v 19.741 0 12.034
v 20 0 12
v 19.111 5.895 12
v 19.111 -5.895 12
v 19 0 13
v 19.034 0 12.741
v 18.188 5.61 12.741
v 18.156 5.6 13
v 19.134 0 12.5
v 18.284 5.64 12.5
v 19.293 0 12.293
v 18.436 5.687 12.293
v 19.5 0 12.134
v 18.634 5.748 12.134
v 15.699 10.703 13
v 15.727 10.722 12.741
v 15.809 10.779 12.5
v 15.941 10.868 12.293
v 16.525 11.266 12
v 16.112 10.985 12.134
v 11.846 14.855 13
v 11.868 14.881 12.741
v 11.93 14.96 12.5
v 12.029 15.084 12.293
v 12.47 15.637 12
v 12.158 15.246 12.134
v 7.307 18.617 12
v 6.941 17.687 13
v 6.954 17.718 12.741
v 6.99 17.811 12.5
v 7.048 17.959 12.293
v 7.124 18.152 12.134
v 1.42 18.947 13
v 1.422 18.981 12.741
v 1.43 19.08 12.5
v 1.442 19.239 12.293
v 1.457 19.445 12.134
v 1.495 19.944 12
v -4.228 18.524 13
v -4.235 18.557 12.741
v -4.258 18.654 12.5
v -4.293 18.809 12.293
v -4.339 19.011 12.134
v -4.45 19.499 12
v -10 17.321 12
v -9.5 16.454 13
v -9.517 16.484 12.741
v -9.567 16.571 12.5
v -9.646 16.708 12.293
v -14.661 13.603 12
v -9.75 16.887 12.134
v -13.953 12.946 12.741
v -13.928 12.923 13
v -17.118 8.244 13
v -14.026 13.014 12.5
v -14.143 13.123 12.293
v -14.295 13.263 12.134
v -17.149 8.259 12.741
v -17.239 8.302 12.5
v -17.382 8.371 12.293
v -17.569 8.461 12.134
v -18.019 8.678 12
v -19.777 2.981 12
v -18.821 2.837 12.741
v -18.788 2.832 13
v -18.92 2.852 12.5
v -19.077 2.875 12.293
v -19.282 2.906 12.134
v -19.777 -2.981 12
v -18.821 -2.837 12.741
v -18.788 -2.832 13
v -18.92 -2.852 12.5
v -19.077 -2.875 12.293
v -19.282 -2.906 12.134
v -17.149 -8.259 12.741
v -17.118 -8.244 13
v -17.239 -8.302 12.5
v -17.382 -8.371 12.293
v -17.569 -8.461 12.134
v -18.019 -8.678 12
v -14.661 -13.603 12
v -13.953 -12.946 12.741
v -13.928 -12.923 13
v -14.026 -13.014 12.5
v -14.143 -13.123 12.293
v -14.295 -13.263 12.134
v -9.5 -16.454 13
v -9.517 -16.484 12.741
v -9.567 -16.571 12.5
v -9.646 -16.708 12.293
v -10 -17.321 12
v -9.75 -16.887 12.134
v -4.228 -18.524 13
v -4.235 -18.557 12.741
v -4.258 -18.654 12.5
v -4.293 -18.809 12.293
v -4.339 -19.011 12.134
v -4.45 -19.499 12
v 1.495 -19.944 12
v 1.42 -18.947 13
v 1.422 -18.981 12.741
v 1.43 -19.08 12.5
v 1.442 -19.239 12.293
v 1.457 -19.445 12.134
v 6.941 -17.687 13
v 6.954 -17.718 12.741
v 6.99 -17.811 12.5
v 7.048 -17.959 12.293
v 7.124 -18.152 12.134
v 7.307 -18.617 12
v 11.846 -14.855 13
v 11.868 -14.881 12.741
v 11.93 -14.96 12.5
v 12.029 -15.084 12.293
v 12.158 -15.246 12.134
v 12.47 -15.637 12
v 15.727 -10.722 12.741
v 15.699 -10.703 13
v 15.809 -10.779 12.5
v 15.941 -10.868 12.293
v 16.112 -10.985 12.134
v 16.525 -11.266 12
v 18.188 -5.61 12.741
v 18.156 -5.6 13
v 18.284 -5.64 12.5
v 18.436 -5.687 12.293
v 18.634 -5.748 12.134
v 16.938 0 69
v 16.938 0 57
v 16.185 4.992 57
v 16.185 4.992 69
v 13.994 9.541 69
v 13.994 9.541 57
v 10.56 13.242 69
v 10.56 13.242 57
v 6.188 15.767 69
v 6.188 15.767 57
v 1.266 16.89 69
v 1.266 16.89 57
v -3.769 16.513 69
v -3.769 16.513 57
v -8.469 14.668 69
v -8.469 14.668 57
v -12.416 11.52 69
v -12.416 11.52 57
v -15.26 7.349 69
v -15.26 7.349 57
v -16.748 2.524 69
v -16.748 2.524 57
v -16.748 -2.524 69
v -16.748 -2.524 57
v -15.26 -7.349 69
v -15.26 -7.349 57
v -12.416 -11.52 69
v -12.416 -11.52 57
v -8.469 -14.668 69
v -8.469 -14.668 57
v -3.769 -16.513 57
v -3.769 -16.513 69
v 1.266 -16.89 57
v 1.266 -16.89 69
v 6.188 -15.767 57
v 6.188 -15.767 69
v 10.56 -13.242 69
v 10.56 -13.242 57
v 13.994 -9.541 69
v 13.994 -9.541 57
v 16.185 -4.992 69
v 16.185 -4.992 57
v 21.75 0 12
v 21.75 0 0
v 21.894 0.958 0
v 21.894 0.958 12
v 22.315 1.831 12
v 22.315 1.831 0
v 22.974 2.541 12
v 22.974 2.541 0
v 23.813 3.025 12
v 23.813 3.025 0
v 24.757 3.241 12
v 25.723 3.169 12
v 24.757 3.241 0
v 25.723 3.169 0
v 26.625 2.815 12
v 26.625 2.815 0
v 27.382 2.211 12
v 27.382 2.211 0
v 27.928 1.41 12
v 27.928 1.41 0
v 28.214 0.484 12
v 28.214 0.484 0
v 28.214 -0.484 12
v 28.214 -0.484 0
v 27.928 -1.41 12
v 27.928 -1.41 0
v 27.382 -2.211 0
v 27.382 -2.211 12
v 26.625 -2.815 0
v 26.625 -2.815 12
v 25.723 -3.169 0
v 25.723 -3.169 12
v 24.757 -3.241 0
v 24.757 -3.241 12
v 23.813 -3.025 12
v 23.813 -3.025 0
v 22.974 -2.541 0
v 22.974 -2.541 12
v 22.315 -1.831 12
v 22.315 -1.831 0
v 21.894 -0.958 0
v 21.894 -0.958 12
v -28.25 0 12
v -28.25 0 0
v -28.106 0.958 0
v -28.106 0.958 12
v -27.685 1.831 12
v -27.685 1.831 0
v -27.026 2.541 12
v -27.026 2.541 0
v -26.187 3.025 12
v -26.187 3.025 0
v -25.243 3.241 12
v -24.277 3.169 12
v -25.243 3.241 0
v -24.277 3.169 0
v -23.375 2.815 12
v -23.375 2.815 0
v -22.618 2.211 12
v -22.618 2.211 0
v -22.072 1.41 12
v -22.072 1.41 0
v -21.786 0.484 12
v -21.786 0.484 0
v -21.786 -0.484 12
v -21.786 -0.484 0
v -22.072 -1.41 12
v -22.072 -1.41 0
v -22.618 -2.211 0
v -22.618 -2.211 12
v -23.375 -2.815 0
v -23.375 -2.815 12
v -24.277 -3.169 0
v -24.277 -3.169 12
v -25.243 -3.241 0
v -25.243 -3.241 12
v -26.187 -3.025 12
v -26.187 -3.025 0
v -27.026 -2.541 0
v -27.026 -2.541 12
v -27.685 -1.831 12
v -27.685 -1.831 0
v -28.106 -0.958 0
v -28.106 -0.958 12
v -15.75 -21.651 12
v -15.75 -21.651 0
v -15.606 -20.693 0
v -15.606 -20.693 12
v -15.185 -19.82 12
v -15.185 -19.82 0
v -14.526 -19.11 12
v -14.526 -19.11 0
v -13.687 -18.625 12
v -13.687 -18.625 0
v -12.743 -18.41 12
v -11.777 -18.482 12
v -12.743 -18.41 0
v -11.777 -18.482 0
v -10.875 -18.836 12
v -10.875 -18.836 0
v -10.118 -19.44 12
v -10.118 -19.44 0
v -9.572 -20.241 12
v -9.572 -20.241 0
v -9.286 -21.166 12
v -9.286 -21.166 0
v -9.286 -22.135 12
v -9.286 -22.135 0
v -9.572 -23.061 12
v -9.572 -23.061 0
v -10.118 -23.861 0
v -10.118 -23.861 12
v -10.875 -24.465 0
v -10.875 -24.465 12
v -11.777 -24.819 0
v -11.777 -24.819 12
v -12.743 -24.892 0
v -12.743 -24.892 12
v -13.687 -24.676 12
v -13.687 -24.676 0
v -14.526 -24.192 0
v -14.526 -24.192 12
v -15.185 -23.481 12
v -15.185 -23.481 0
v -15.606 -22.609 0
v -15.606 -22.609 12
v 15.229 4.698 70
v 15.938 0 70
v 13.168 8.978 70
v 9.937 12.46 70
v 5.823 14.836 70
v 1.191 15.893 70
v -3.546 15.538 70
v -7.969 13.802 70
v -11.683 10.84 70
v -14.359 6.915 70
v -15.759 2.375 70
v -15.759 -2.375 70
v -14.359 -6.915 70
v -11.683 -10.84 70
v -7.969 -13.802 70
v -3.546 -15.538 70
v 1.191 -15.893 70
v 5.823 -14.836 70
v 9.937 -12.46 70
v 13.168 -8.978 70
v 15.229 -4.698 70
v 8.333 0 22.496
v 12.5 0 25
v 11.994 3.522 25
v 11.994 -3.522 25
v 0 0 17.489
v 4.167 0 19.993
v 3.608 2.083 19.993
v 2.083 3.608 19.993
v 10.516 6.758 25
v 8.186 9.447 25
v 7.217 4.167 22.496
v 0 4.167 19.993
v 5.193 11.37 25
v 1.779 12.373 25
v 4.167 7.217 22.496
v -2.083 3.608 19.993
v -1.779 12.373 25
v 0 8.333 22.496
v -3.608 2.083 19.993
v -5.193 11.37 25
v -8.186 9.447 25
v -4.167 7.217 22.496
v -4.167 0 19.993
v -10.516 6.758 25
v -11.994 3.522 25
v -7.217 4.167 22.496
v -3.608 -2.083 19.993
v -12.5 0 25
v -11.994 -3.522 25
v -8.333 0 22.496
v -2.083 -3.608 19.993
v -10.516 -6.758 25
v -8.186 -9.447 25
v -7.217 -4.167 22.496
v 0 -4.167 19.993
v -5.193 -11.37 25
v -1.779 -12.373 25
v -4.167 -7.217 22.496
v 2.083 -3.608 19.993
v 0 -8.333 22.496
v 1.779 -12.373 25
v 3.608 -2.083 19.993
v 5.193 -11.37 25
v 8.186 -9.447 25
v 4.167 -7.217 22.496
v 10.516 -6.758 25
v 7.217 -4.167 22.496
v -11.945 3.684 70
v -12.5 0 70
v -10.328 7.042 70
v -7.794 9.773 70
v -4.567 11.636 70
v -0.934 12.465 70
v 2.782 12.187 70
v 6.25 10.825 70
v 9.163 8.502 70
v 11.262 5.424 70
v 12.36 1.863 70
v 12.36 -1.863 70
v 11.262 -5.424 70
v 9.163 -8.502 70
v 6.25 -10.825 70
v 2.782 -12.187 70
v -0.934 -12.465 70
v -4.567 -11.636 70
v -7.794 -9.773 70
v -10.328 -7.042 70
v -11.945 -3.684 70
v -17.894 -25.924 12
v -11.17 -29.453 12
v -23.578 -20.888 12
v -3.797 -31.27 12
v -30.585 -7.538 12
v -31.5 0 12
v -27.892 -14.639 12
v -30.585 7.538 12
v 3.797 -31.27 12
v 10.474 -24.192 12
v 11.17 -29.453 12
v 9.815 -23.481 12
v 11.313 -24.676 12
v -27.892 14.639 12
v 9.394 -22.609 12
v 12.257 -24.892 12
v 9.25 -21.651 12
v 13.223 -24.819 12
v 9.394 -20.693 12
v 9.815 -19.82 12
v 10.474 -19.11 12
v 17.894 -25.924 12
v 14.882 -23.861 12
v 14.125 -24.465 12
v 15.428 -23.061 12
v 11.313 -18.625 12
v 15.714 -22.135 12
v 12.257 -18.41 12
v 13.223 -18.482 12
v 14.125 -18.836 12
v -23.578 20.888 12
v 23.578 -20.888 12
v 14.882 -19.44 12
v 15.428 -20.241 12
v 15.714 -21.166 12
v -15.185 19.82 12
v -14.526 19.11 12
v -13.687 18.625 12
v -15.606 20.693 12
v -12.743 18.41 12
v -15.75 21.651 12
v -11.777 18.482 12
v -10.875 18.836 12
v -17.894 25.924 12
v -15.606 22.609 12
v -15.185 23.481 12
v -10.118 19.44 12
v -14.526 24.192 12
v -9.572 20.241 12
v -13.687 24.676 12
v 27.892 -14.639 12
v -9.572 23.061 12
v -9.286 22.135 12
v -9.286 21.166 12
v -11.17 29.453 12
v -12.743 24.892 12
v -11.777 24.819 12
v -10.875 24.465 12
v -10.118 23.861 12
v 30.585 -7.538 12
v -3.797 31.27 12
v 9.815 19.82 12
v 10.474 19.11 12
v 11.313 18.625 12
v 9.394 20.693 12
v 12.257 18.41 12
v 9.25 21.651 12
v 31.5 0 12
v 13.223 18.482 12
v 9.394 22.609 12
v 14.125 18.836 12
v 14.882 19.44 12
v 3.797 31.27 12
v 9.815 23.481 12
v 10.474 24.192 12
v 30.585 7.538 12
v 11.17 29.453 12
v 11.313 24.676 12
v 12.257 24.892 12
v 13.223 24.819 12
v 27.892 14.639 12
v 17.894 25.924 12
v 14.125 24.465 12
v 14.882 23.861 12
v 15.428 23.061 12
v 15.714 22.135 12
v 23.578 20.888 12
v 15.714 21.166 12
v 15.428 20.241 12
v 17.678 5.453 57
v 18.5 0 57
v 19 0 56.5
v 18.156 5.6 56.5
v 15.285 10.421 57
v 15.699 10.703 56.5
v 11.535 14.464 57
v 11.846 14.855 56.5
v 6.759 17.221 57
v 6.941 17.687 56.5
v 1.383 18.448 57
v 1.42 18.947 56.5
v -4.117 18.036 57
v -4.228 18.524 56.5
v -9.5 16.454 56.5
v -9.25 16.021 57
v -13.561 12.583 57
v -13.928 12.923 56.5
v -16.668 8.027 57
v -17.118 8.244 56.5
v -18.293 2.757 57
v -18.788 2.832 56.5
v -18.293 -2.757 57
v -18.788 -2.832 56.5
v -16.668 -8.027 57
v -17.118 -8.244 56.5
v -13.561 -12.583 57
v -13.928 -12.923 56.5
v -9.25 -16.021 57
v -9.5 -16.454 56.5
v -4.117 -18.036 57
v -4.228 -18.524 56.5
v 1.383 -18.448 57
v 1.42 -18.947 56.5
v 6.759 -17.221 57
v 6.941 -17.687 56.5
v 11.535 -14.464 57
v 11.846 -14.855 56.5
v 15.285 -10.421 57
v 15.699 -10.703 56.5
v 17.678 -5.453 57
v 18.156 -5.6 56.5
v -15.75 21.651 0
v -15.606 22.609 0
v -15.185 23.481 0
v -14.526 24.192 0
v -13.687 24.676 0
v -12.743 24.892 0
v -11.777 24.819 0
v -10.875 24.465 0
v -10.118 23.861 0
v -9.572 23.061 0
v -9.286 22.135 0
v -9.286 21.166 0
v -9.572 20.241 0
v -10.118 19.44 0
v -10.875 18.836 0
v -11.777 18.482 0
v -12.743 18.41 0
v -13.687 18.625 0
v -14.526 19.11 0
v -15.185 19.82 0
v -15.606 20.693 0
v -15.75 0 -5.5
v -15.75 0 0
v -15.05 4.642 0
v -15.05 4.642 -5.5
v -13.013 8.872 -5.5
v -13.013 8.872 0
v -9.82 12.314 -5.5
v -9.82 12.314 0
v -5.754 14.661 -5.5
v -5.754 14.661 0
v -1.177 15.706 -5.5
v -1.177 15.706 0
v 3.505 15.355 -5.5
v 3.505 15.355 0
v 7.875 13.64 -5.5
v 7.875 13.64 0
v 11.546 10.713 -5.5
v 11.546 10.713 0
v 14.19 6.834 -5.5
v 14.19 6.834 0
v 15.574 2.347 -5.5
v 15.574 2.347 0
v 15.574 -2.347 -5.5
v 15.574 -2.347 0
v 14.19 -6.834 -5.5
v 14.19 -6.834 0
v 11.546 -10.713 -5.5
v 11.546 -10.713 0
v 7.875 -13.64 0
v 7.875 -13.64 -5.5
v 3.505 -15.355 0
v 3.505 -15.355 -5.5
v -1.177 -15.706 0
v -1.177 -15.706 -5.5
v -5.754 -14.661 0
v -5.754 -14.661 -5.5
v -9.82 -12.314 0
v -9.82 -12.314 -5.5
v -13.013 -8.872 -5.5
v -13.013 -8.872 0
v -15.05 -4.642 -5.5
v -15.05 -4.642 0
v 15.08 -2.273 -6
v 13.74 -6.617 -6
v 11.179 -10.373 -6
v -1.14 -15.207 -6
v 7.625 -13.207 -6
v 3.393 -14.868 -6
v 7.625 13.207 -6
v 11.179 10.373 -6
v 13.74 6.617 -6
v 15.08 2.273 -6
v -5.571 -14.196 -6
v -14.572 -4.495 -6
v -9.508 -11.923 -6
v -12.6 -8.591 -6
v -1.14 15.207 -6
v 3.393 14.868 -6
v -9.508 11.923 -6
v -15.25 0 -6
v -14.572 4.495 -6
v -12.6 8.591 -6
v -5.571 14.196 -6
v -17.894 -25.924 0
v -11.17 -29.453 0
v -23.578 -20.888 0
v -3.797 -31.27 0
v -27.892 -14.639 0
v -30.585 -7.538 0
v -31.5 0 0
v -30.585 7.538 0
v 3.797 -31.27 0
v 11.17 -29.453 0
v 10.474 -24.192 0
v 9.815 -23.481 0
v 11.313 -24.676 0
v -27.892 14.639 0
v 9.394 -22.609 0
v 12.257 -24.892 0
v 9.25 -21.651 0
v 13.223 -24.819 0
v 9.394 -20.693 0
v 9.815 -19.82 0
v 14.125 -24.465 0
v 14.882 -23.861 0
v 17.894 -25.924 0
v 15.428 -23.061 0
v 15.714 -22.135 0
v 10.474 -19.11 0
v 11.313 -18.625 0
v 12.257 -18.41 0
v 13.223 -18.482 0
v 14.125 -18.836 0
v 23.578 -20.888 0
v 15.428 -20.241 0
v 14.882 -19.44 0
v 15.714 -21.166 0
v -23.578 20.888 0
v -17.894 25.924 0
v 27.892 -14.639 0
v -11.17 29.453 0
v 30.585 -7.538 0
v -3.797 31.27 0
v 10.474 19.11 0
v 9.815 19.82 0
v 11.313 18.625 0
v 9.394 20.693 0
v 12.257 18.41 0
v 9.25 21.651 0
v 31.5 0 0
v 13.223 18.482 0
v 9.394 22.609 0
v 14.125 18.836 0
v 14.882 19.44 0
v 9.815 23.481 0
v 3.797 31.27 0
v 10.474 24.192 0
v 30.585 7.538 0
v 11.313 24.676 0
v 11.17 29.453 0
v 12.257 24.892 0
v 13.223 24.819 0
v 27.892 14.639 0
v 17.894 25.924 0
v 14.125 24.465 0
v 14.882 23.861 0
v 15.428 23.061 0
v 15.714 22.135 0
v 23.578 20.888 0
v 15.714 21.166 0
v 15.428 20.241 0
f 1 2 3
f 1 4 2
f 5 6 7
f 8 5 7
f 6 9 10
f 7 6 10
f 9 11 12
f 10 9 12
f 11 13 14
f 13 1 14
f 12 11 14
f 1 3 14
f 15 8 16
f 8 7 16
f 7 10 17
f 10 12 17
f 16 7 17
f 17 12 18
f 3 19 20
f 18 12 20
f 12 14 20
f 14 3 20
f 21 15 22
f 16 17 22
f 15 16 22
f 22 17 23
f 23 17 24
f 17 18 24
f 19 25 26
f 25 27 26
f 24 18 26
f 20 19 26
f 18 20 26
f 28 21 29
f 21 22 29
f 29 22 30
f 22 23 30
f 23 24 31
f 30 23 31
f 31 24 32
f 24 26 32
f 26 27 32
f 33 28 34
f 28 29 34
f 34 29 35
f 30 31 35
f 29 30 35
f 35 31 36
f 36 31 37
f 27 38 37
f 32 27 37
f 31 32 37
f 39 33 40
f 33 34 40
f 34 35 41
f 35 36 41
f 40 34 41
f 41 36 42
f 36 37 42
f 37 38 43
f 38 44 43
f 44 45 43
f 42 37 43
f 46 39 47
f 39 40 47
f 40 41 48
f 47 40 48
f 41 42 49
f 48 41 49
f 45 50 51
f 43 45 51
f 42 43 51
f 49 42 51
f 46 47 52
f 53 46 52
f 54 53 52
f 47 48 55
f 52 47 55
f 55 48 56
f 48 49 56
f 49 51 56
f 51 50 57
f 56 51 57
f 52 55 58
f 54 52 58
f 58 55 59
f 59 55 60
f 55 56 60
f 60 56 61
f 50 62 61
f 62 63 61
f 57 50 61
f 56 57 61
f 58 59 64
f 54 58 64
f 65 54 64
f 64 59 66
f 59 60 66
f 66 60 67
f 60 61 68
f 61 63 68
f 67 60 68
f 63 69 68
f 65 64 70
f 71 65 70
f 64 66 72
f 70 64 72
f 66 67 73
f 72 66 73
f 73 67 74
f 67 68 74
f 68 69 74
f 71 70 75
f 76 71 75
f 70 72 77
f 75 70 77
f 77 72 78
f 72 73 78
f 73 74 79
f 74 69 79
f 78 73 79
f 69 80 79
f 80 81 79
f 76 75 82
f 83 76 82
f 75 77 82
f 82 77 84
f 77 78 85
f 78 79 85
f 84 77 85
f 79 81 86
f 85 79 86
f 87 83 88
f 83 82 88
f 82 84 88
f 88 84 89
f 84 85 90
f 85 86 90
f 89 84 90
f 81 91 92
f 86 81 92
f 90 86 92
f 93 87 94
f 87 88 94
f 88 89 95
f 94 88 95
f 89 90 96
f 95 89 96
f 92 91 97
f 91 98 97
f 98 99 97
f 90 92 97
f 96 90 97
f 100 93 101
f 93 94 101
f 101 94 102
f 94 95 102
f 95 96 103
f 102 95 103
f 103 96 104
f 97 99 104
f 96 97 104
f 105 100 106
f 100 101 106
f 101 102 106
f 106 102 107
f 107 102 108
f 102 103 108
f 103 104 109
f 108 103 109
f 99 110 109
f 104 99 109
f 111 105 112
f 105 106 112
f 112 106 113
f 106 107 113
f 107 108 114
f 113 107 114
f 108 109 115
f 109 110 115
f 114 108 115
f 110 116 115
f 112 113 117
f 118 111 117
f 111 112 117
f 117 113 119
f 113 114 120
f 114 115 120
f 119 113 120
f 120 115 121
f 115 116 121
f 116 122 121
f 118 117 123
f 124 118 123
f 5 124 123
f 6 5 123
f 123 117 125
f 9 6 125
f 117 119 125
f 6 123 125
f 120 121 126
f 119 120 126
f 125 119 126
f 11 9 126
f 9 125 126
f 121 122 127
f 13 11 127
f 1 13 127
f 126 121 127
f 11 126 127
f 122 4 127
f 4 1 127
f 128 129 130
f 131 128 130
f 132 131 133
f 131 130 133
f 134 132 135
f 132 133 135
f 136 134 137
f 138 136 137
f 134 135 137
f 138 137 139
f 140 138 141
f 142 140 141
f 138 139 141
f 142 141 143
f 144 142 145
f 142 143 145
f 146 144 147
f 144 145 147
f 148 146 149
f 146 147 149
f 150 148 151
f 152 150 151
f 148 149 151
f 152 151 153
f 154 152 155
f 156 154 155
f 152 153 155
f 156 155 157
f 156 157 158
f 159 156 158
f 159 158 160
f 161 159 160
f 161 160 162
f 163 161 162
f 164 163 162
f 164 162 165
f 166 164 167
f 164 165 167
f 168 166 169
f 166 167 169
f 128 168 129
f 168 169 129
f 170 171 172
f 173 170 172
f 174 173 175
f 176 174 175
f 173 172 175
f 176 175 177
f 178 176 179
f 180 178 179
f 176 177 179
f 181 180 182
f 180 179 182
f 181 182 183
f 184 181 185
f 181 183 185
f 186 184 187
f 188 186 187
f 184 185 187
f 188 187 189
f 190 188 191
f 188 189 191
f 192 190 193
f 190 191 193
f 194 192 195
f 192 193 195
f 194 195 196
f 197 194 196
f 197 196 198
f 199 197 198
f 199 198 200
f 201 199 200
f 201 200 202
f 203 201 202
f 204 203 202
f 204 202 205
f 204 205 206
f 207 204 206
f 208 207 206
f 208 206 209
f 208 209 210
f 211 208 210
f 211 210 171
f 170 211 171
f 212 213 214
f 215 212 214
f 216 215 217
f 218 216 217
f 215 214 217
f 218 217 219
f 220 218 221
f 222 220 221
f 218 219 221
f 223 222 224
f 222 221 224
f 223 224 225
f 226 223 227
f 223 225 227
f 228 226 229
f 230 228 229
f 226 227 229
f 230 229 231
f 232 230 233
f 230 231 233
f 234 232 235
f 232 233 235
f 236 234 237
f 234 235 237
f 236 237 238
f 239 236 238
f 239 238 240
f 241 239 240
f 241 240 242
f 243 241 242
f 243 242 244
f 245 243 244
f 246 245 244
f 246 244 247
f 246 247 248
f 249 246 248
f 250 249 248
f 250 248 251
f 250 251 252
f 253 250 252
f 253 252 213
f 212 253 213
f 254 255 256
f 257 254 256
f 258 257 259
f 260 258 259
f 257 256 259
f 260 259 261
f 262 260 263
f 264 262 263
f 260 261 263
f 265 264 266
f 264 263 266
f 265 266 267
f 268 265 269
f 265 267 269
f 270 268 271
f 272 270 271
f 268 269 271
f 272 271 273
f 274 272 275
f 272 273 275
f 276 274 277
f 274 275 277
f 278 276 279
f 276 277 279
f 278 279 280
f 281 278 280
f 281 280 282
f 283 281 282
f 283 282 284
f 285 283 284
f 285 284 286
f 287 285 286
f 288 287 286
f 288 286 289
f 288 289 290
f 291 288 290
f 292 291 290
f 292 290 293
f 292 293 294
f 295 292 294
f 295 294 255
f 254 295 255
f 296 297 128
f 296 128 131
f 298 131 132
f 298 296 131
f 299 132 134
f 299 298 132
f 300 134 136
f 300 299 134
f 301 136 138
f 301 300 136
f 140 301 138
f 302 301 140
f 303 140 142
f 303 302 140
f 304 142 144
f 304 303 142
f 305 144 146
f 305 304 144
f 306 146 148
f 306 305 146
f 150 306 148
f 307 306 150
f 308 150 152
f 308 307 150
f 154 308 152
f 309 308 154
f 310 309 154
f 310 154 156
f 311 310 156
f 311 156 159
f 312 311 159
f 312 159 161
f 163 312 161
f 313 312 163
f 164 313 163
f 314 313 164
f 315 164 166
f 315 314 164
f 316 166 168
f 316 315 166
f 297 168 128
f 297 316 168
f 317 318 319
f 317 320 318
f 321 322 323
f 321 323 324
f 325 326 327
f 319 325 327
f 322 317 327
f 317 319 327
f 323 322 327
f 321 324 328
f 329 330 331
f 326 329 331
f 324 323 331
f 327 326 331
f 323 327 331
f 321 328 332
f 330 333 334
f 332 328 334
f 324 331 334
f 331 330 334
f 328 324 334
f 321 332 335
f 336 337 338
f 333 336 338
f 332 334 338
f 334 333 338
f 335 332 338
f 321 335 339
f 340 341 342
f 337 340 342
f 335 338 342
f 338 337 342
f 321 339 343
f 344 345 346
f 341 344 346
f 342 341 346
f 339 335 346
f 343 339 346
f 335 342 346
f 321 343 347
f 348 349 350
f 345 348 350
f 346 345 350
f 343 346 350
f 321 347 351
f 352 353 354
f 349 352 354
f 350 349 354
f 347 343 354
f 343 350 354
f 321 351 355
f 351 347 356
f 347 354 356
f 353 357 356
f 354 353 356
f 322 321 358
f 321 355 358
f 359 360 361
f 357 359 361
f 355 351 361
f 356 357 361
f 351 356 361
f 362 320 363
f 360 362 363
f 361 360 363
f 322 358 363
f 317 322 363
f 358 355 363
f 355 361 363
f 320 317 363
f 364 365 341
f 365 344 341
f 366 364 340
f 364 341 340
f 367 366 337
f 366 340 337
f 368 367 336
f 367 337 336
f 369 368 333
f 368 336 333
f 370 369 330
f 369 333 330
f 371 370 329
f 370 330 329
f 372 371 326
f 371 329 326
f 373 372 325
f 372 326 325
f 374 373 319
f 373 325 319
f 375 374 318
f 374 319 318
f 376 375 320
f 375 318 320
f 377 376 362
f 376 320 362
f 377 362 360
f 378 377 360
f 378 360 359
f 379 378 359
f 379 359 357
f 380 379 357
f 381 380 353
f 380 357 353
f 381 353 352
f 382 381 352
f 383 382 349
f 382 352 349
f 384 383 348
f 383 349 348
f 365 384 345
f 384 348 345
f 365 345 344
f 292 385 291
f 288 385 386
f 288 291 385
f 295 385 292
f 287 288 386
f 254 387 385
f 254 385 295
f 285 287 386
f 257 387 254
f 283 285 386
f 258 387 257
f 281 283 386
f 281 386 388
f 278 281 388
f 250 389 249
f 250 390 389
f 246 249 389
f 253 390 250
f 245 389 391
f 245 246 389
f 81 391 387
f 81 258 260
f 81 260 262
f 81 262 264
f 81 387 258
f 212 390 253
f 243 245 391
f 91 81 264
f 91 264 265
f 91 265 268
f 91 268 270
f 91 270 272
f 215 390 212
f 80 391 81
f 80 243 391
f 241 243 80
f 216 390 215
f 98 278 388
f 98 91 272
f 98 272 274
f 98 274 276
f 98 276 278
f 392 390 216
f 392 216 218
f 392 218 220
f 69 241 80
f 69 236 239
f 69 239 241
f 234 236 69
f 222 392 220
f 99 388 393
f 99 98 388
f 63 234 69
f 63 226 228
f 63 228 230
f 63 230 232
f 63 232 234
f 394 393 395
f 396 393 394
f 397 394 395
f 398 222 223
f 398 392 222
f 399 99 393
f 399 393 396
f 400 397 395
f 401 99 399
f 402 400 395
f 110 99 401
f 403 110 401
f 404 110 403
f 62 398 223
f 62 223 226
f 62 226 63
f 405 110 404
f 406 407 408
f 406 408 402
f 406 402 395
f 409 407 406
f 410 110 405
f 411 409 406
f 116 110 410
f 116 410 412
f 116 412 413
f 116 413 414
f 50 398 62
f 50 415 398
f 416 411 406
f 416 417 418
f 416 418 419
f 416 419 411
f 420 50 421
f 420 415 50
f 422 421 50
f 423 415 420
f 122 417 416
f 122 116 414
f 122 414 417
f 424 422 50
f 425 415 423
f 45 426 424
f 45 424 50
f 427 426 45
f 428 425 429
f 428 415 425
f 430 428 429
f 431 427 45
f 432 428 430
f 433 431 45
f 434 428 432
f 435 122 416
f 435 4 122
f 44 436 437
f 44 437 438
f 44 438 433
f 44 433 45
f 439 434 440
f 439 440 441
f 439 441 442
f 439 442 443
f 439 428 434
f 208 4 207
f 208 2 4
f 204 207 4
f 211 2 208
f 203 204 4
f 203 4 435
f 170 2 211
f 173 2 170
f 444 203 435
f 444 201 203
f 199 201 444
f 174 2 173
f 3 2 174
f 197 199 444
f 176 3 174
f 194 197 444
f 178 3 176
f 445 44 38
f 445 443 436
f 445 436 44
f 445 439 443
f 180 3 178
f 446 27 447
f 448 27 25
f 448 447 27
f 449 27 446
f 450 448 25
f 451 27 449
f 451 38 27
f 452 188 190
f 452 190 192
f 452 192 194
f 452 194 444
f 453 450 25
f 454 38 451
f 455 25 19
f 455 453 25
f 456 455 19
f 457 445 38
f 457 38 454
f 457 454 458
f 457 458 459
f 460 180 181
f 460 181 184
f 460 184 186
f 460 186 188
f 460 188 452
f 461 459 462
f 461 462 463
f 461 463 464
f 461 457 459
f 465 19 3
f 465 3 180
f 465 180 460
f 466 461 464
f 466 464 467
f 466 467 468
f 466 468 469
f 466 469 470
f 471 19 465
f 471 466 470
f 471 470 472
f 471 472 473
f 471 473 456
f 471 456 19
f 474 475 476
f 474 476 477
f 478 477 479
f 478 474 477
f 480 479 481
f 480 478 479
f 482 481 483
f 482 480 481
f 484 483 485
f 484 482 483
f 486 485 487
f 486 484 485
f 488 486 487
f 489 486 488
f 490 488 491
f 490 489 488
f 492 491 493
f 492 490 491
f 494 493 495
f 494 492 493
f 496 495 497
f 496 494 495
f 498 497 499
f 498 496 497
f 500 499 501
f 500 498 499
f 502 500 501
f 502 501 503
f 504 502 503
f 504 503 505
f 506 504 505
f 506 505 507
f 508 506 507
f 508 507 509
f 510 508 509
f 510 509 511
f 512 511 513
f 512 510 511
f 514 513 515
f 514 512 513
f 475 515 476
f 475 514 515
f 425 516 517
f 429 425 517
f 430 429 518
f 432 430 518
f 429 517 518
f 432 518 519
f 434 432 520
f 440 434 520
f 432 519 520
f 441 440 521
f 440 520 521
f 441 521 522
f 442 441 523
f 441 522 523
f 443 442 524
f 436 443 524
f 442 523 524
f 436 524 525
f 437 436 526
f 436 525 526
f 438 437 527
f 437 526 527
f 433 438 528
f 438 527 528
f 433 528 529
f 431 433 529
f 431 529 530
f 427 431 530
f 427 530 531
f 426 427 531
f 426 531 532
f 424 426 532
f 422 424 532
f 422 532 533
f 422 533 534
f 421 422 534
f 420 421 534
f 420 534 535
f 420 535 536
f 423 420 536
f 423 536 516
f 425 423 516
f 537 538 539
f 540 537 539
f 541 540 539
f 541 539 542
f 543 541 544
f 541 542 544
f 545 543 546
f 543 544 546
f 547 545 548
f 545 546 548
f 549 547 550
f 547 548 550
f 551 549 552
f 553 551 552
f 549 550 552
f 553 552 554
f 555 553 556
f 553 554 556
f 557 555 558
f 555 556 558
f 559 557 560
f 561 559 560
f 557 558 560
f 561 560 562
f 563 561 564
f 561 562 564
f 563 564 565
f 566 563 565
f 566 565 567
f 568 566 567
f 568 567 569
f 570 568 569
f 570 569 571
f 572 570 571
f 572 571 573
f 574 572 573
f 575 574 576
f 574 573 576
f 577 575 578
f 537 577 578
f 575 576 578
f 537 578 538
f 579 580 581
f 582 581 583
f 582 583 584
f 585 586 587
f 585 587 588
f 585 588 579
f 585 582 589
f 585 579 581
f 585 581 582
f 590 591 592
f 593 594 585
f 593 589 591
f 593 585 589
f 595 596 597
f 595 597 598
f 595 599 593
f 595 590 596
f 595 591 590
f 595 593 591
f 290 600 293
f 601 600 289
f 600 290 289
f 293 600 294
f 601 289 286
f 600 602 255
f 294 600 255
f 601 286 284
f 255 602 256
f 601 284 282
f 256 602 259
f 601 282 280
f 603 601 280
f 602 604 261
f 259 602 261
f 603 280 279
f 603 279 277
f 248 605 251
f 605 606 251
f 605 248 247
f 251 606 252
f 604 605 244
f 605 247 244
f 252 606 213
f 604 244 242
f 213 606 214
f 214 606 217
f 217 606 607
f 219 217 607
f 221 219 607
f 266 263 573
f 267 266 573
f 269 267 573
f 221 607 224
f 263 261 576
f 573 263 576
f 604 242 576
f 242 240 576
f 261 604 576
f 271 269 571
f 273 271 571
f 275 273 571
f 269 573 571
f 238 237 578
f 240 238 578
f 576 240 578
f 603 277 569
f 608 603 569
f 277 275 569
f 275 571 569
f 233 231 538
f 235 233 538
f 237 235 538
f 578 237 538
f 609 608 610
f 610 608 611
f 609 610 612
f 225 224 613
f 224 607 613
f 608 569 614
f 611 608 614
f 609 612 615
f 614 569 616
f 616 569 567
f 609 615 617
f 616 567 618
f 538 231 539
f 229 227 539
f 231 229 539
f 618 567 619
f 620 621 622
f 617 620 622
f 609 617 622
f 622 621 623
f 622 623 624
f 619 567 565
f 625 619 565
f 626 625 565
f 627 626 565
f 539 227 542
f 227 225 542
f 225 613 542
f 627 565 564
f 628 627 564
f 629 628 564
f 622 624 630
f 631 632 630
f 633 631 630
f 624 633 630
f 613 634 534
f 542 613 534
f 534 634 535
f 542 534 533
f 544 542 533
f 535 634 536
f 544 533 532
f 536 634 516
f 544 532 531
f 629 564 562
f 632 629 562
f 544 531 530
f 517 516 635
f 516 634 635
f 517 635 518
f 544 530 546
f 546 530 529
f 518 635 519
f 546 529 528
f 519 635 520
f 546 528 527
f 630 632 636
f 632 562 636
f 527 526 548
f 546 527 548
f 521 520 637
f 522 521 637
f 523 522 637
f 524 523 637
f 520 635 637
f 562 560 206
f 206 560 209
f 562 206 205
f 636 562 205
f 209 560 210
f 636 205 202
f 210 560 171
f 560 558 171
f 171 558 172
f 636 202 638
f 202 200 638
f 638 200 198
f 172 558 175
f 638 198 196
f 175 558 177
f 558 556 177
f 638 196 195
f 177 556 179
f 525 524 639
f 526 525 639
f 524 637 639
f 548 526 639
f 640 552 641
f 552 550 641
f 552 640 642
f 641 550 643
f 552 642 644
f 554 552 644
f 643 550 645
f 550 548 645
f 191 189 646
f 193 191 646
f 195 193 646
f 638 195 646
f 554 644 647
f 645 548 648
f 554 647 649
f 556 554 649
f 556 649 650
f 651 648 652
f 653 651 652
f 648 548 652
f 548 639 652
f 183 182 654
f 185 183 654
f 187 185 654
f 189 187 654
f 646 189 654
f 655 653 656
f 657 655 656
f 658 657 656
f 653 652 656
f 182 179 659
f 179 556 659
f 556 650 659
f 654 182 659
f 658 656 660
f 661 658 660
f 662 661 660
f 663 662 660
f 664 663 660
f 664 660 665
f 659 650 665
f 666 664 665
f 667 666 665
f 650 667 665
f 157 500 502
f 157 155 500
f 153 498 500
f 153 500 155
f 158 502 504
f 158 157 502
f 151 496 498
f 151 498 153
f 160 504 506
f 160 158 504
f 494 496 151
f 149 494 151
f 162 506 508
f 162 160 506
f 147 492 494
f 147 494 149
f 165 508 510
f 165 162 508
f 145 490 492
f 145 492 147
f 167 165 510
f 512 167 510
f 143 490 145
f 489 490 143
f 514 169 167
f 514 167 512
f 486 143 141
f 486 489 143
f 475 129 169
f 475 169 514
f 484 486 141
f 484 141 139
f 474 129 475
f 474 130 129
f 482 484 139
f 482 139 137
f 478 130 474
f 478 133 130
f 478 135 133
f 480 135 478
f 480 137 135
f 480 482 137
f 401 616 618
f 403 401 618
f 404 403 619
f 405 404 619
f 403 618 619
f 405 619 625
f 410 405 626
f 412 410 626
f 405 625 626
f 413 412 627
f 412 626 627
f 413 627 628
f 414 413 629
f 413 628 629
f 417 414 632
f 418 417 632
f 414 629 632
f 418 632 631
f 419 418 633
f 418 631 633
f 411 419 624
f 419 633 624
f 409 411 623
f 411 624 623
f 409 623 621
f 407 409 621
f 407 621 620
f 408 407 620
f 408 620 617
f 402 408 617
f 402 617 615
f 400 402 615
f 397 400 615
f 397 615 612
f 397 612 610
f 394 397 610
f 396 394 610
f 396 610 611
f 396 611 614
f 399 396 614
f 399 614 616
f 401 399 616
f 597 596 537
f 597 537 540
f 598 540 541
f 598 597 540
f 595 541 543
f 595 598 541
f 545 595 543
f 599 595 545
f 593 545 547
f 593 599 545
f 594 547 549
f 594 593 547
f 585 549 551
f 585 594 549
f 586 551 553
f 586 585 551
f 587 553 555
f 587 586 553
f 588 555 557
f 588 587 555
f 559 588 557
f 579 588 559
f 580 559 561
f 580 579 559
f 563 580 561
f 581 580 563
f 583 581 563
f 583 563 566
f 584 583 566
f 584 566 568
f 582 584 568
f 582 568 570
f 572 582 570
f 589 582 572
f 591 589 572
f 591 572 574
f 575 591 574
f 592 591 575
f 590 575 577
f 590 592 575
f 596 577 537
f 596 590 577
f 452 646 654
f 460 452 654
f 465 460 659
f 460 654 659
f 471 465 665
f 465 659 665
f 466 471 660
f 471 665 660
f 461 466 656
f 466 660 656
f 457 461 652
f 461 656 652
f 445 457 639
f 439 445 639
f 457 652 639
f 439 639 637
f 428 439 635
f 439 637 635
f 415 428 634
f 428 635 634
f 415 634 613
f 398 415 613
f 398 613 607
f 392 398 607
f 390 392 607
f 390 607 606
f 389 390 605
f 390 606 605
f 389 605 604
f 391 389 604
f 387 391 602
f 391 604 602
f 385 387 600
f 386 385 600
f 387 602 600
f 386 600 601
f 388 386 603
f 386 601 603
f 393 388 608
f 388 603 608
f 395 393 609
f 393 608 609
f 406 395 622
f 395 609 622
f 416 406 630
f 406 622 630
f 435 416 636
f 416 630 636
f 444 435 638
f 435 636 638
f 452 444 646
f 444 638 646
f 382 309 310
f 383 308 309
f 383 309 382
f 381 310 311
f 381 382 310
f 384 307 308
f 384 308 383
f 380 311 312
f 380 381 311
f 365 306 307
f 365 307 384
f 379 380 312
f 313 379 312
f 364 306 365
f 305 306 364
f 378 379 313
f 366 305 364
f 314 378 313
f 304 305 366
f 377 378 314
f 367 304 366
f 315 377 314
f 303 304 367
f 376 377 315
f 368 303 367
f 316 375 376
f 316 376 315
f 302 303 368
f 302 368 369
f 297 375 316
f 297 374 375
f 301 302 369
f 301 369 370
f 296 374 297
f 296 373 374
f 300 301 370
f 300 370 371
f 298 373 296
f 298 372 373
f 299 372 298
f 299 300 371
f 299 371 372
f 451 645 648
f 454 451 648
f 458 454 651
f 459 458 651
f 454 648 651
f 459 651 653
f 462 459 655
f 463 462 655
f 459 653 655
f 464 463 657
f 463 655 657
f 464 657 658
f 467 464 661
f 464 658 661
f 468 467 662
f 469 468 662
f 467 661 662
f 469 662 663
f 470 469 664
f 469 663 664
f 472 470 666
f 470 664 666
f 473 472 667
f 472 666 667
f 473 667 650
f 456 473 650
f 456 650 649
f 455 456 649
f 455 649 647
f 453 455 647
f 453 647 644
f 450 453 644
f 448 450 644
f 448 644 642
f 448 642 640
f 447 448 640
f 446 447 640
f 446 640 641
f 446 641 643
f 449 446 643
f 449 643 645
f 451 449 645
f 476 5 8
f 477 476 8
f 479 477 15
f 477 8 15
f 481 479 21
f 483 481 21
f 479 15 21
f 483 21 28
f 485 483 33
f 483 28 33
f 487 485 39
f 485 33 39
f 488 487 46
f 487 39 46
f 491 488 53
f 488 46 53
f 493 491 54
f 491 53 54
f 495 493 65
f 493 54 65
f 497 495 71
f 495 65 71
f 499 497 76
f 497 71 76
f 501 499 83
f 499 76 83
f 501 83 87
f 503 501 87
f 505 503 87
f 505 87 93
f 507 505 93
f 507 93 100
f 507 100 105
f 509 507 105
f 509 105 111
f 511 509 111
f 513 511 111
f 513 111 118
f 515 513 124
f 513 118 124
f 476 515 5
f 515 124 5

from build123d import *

# Parameters (mm, degrees)
SKETCH1_R                  = 31.5
BOSS_EXTRUDE1_DEPTH        = 12
SKETCH3_R                  = 15.75
BOSS_EXTRUDE2_DEPTH        = 6
F_6_5_6_5_DIAMETER_HOLE1_D = 6.5
SKETCH14_R                 = 19
BOSS_EXTRUDE4_DEPTH        = 45
CHAMFER2_SIZE              = 0.5
FILLET3_R                  = 1
SKETCH15_R                 = 16.9375
BOSS_EXTRUDE6_DEPTH        = 13
CHAMFER3_SIZE              = 1
CHAMFER6_SIZE              = 0.5
F_25_0MM_DOWEL_HOLE1_D     = 25
F_25_0MM_DOWEL_HOLE1_DEPTH = 45
F_25_0MM_DOWEL_HOLE1_TIP   = 7.510757738


with BuildPart() as part:
    # Sketch1 → Boss-Extrude1 (new body)
    with BuildSketch(Plane.XY):
        Circle(SKETCH1_R)
    extrude(amount=BOSS_EXTRUDE1_DEPTH)

    # Sketch3 → Boss-Extrude2 (add)
    with BuildSketch(Plane(origin=(0, 0, 0), x_dir=(-1, 0, 0), z_dir=(0, 0, -1))):
        Circle(SKETCH3_R)
    extrude(amount=BOSS_EXTRUDE2_DEPTH)

    # Ø6.5 (6.5) Diameter Hole1 (through all)
    with Locations(Plane.XY.offset(12)):
        with Locations((-12.5, 21.650635095), (-25, 0), (-12.5, -21.650635095), (12.5, -21.650635095), (25, 0), (12.5, 21.650635095)):
            Hole(F_6_5_6_5_DIAMETER_HOLE1_D / 2)

    # Sketch14 → Boss-Extrude4 (add)
    with BuildSketch(Plane.XY.offset(12)):
        Circle(SKETCH14_R)
    extrude(amount=BOSS_EXTRUDE4_DEPTH)

    # Chamfer2
    chamfer2_edges = [part.edges().sort_by_distance(p)[0] for p in [
        (-19, 0, 57),
    ]]
    chamfer(chamfer2_edges, length=CHAMFER2_SIZE)

    # Fillet3
    fillet3_edges = [part.edges().sort_by_distance(p)[0] for p in [
        (-19, 0, 12),
    ]]
    fillet(fillet3_edges, radius=FILLET3_R)

    # Sketch15 → Boss-Extrude6 (add)
    with BuildSketch(Plane.XY.offset(57)):
        Circle(SKETCH15_R)
    extrude(amount=BOSS_EXTRUDE6_DEPTH)

    # Chamfer3
    chamfer3_edges = [part.edges().sort_by_distance(p)[0] for p in [
        (-16.9375, 0, 70),
    ]]
    chamfer(chamfer3_edges, length=CHAMFER3_SIZE)

    # Chamfer6
    chamfer6_edges = [part.edges().sort_by_distance(p)[0] for p in [
        (15.75, 0, -6),
    ]]
    chamfer(chamfer6_edges, length=CHAMFER6_SIZE)

    # Ø25.0mm Dowel Hole1
    with Locations(Plane.XY.offset(70)):
        with Locations((0, 0)):
            Hole(F_25_0MM_DOWEL_HOLE1_D / 2, depth=F_25_0MM_DOWEL_HOLE1_DEPTH)
            with Locations((0, 0, -(F_25_0MM_DOWEL_HOLE1_DEPTH + F_25_0MM_DOWEL_HOLE1_TIP / 2))):  # 118° drill point
                Cone(0, F_25_0MM_DOWEL_HOLE1_D / 2, F_25_0MM_DOWEL_HOLE1_TIP, mode=Mode.SUBTRACT)


solid = part.part
